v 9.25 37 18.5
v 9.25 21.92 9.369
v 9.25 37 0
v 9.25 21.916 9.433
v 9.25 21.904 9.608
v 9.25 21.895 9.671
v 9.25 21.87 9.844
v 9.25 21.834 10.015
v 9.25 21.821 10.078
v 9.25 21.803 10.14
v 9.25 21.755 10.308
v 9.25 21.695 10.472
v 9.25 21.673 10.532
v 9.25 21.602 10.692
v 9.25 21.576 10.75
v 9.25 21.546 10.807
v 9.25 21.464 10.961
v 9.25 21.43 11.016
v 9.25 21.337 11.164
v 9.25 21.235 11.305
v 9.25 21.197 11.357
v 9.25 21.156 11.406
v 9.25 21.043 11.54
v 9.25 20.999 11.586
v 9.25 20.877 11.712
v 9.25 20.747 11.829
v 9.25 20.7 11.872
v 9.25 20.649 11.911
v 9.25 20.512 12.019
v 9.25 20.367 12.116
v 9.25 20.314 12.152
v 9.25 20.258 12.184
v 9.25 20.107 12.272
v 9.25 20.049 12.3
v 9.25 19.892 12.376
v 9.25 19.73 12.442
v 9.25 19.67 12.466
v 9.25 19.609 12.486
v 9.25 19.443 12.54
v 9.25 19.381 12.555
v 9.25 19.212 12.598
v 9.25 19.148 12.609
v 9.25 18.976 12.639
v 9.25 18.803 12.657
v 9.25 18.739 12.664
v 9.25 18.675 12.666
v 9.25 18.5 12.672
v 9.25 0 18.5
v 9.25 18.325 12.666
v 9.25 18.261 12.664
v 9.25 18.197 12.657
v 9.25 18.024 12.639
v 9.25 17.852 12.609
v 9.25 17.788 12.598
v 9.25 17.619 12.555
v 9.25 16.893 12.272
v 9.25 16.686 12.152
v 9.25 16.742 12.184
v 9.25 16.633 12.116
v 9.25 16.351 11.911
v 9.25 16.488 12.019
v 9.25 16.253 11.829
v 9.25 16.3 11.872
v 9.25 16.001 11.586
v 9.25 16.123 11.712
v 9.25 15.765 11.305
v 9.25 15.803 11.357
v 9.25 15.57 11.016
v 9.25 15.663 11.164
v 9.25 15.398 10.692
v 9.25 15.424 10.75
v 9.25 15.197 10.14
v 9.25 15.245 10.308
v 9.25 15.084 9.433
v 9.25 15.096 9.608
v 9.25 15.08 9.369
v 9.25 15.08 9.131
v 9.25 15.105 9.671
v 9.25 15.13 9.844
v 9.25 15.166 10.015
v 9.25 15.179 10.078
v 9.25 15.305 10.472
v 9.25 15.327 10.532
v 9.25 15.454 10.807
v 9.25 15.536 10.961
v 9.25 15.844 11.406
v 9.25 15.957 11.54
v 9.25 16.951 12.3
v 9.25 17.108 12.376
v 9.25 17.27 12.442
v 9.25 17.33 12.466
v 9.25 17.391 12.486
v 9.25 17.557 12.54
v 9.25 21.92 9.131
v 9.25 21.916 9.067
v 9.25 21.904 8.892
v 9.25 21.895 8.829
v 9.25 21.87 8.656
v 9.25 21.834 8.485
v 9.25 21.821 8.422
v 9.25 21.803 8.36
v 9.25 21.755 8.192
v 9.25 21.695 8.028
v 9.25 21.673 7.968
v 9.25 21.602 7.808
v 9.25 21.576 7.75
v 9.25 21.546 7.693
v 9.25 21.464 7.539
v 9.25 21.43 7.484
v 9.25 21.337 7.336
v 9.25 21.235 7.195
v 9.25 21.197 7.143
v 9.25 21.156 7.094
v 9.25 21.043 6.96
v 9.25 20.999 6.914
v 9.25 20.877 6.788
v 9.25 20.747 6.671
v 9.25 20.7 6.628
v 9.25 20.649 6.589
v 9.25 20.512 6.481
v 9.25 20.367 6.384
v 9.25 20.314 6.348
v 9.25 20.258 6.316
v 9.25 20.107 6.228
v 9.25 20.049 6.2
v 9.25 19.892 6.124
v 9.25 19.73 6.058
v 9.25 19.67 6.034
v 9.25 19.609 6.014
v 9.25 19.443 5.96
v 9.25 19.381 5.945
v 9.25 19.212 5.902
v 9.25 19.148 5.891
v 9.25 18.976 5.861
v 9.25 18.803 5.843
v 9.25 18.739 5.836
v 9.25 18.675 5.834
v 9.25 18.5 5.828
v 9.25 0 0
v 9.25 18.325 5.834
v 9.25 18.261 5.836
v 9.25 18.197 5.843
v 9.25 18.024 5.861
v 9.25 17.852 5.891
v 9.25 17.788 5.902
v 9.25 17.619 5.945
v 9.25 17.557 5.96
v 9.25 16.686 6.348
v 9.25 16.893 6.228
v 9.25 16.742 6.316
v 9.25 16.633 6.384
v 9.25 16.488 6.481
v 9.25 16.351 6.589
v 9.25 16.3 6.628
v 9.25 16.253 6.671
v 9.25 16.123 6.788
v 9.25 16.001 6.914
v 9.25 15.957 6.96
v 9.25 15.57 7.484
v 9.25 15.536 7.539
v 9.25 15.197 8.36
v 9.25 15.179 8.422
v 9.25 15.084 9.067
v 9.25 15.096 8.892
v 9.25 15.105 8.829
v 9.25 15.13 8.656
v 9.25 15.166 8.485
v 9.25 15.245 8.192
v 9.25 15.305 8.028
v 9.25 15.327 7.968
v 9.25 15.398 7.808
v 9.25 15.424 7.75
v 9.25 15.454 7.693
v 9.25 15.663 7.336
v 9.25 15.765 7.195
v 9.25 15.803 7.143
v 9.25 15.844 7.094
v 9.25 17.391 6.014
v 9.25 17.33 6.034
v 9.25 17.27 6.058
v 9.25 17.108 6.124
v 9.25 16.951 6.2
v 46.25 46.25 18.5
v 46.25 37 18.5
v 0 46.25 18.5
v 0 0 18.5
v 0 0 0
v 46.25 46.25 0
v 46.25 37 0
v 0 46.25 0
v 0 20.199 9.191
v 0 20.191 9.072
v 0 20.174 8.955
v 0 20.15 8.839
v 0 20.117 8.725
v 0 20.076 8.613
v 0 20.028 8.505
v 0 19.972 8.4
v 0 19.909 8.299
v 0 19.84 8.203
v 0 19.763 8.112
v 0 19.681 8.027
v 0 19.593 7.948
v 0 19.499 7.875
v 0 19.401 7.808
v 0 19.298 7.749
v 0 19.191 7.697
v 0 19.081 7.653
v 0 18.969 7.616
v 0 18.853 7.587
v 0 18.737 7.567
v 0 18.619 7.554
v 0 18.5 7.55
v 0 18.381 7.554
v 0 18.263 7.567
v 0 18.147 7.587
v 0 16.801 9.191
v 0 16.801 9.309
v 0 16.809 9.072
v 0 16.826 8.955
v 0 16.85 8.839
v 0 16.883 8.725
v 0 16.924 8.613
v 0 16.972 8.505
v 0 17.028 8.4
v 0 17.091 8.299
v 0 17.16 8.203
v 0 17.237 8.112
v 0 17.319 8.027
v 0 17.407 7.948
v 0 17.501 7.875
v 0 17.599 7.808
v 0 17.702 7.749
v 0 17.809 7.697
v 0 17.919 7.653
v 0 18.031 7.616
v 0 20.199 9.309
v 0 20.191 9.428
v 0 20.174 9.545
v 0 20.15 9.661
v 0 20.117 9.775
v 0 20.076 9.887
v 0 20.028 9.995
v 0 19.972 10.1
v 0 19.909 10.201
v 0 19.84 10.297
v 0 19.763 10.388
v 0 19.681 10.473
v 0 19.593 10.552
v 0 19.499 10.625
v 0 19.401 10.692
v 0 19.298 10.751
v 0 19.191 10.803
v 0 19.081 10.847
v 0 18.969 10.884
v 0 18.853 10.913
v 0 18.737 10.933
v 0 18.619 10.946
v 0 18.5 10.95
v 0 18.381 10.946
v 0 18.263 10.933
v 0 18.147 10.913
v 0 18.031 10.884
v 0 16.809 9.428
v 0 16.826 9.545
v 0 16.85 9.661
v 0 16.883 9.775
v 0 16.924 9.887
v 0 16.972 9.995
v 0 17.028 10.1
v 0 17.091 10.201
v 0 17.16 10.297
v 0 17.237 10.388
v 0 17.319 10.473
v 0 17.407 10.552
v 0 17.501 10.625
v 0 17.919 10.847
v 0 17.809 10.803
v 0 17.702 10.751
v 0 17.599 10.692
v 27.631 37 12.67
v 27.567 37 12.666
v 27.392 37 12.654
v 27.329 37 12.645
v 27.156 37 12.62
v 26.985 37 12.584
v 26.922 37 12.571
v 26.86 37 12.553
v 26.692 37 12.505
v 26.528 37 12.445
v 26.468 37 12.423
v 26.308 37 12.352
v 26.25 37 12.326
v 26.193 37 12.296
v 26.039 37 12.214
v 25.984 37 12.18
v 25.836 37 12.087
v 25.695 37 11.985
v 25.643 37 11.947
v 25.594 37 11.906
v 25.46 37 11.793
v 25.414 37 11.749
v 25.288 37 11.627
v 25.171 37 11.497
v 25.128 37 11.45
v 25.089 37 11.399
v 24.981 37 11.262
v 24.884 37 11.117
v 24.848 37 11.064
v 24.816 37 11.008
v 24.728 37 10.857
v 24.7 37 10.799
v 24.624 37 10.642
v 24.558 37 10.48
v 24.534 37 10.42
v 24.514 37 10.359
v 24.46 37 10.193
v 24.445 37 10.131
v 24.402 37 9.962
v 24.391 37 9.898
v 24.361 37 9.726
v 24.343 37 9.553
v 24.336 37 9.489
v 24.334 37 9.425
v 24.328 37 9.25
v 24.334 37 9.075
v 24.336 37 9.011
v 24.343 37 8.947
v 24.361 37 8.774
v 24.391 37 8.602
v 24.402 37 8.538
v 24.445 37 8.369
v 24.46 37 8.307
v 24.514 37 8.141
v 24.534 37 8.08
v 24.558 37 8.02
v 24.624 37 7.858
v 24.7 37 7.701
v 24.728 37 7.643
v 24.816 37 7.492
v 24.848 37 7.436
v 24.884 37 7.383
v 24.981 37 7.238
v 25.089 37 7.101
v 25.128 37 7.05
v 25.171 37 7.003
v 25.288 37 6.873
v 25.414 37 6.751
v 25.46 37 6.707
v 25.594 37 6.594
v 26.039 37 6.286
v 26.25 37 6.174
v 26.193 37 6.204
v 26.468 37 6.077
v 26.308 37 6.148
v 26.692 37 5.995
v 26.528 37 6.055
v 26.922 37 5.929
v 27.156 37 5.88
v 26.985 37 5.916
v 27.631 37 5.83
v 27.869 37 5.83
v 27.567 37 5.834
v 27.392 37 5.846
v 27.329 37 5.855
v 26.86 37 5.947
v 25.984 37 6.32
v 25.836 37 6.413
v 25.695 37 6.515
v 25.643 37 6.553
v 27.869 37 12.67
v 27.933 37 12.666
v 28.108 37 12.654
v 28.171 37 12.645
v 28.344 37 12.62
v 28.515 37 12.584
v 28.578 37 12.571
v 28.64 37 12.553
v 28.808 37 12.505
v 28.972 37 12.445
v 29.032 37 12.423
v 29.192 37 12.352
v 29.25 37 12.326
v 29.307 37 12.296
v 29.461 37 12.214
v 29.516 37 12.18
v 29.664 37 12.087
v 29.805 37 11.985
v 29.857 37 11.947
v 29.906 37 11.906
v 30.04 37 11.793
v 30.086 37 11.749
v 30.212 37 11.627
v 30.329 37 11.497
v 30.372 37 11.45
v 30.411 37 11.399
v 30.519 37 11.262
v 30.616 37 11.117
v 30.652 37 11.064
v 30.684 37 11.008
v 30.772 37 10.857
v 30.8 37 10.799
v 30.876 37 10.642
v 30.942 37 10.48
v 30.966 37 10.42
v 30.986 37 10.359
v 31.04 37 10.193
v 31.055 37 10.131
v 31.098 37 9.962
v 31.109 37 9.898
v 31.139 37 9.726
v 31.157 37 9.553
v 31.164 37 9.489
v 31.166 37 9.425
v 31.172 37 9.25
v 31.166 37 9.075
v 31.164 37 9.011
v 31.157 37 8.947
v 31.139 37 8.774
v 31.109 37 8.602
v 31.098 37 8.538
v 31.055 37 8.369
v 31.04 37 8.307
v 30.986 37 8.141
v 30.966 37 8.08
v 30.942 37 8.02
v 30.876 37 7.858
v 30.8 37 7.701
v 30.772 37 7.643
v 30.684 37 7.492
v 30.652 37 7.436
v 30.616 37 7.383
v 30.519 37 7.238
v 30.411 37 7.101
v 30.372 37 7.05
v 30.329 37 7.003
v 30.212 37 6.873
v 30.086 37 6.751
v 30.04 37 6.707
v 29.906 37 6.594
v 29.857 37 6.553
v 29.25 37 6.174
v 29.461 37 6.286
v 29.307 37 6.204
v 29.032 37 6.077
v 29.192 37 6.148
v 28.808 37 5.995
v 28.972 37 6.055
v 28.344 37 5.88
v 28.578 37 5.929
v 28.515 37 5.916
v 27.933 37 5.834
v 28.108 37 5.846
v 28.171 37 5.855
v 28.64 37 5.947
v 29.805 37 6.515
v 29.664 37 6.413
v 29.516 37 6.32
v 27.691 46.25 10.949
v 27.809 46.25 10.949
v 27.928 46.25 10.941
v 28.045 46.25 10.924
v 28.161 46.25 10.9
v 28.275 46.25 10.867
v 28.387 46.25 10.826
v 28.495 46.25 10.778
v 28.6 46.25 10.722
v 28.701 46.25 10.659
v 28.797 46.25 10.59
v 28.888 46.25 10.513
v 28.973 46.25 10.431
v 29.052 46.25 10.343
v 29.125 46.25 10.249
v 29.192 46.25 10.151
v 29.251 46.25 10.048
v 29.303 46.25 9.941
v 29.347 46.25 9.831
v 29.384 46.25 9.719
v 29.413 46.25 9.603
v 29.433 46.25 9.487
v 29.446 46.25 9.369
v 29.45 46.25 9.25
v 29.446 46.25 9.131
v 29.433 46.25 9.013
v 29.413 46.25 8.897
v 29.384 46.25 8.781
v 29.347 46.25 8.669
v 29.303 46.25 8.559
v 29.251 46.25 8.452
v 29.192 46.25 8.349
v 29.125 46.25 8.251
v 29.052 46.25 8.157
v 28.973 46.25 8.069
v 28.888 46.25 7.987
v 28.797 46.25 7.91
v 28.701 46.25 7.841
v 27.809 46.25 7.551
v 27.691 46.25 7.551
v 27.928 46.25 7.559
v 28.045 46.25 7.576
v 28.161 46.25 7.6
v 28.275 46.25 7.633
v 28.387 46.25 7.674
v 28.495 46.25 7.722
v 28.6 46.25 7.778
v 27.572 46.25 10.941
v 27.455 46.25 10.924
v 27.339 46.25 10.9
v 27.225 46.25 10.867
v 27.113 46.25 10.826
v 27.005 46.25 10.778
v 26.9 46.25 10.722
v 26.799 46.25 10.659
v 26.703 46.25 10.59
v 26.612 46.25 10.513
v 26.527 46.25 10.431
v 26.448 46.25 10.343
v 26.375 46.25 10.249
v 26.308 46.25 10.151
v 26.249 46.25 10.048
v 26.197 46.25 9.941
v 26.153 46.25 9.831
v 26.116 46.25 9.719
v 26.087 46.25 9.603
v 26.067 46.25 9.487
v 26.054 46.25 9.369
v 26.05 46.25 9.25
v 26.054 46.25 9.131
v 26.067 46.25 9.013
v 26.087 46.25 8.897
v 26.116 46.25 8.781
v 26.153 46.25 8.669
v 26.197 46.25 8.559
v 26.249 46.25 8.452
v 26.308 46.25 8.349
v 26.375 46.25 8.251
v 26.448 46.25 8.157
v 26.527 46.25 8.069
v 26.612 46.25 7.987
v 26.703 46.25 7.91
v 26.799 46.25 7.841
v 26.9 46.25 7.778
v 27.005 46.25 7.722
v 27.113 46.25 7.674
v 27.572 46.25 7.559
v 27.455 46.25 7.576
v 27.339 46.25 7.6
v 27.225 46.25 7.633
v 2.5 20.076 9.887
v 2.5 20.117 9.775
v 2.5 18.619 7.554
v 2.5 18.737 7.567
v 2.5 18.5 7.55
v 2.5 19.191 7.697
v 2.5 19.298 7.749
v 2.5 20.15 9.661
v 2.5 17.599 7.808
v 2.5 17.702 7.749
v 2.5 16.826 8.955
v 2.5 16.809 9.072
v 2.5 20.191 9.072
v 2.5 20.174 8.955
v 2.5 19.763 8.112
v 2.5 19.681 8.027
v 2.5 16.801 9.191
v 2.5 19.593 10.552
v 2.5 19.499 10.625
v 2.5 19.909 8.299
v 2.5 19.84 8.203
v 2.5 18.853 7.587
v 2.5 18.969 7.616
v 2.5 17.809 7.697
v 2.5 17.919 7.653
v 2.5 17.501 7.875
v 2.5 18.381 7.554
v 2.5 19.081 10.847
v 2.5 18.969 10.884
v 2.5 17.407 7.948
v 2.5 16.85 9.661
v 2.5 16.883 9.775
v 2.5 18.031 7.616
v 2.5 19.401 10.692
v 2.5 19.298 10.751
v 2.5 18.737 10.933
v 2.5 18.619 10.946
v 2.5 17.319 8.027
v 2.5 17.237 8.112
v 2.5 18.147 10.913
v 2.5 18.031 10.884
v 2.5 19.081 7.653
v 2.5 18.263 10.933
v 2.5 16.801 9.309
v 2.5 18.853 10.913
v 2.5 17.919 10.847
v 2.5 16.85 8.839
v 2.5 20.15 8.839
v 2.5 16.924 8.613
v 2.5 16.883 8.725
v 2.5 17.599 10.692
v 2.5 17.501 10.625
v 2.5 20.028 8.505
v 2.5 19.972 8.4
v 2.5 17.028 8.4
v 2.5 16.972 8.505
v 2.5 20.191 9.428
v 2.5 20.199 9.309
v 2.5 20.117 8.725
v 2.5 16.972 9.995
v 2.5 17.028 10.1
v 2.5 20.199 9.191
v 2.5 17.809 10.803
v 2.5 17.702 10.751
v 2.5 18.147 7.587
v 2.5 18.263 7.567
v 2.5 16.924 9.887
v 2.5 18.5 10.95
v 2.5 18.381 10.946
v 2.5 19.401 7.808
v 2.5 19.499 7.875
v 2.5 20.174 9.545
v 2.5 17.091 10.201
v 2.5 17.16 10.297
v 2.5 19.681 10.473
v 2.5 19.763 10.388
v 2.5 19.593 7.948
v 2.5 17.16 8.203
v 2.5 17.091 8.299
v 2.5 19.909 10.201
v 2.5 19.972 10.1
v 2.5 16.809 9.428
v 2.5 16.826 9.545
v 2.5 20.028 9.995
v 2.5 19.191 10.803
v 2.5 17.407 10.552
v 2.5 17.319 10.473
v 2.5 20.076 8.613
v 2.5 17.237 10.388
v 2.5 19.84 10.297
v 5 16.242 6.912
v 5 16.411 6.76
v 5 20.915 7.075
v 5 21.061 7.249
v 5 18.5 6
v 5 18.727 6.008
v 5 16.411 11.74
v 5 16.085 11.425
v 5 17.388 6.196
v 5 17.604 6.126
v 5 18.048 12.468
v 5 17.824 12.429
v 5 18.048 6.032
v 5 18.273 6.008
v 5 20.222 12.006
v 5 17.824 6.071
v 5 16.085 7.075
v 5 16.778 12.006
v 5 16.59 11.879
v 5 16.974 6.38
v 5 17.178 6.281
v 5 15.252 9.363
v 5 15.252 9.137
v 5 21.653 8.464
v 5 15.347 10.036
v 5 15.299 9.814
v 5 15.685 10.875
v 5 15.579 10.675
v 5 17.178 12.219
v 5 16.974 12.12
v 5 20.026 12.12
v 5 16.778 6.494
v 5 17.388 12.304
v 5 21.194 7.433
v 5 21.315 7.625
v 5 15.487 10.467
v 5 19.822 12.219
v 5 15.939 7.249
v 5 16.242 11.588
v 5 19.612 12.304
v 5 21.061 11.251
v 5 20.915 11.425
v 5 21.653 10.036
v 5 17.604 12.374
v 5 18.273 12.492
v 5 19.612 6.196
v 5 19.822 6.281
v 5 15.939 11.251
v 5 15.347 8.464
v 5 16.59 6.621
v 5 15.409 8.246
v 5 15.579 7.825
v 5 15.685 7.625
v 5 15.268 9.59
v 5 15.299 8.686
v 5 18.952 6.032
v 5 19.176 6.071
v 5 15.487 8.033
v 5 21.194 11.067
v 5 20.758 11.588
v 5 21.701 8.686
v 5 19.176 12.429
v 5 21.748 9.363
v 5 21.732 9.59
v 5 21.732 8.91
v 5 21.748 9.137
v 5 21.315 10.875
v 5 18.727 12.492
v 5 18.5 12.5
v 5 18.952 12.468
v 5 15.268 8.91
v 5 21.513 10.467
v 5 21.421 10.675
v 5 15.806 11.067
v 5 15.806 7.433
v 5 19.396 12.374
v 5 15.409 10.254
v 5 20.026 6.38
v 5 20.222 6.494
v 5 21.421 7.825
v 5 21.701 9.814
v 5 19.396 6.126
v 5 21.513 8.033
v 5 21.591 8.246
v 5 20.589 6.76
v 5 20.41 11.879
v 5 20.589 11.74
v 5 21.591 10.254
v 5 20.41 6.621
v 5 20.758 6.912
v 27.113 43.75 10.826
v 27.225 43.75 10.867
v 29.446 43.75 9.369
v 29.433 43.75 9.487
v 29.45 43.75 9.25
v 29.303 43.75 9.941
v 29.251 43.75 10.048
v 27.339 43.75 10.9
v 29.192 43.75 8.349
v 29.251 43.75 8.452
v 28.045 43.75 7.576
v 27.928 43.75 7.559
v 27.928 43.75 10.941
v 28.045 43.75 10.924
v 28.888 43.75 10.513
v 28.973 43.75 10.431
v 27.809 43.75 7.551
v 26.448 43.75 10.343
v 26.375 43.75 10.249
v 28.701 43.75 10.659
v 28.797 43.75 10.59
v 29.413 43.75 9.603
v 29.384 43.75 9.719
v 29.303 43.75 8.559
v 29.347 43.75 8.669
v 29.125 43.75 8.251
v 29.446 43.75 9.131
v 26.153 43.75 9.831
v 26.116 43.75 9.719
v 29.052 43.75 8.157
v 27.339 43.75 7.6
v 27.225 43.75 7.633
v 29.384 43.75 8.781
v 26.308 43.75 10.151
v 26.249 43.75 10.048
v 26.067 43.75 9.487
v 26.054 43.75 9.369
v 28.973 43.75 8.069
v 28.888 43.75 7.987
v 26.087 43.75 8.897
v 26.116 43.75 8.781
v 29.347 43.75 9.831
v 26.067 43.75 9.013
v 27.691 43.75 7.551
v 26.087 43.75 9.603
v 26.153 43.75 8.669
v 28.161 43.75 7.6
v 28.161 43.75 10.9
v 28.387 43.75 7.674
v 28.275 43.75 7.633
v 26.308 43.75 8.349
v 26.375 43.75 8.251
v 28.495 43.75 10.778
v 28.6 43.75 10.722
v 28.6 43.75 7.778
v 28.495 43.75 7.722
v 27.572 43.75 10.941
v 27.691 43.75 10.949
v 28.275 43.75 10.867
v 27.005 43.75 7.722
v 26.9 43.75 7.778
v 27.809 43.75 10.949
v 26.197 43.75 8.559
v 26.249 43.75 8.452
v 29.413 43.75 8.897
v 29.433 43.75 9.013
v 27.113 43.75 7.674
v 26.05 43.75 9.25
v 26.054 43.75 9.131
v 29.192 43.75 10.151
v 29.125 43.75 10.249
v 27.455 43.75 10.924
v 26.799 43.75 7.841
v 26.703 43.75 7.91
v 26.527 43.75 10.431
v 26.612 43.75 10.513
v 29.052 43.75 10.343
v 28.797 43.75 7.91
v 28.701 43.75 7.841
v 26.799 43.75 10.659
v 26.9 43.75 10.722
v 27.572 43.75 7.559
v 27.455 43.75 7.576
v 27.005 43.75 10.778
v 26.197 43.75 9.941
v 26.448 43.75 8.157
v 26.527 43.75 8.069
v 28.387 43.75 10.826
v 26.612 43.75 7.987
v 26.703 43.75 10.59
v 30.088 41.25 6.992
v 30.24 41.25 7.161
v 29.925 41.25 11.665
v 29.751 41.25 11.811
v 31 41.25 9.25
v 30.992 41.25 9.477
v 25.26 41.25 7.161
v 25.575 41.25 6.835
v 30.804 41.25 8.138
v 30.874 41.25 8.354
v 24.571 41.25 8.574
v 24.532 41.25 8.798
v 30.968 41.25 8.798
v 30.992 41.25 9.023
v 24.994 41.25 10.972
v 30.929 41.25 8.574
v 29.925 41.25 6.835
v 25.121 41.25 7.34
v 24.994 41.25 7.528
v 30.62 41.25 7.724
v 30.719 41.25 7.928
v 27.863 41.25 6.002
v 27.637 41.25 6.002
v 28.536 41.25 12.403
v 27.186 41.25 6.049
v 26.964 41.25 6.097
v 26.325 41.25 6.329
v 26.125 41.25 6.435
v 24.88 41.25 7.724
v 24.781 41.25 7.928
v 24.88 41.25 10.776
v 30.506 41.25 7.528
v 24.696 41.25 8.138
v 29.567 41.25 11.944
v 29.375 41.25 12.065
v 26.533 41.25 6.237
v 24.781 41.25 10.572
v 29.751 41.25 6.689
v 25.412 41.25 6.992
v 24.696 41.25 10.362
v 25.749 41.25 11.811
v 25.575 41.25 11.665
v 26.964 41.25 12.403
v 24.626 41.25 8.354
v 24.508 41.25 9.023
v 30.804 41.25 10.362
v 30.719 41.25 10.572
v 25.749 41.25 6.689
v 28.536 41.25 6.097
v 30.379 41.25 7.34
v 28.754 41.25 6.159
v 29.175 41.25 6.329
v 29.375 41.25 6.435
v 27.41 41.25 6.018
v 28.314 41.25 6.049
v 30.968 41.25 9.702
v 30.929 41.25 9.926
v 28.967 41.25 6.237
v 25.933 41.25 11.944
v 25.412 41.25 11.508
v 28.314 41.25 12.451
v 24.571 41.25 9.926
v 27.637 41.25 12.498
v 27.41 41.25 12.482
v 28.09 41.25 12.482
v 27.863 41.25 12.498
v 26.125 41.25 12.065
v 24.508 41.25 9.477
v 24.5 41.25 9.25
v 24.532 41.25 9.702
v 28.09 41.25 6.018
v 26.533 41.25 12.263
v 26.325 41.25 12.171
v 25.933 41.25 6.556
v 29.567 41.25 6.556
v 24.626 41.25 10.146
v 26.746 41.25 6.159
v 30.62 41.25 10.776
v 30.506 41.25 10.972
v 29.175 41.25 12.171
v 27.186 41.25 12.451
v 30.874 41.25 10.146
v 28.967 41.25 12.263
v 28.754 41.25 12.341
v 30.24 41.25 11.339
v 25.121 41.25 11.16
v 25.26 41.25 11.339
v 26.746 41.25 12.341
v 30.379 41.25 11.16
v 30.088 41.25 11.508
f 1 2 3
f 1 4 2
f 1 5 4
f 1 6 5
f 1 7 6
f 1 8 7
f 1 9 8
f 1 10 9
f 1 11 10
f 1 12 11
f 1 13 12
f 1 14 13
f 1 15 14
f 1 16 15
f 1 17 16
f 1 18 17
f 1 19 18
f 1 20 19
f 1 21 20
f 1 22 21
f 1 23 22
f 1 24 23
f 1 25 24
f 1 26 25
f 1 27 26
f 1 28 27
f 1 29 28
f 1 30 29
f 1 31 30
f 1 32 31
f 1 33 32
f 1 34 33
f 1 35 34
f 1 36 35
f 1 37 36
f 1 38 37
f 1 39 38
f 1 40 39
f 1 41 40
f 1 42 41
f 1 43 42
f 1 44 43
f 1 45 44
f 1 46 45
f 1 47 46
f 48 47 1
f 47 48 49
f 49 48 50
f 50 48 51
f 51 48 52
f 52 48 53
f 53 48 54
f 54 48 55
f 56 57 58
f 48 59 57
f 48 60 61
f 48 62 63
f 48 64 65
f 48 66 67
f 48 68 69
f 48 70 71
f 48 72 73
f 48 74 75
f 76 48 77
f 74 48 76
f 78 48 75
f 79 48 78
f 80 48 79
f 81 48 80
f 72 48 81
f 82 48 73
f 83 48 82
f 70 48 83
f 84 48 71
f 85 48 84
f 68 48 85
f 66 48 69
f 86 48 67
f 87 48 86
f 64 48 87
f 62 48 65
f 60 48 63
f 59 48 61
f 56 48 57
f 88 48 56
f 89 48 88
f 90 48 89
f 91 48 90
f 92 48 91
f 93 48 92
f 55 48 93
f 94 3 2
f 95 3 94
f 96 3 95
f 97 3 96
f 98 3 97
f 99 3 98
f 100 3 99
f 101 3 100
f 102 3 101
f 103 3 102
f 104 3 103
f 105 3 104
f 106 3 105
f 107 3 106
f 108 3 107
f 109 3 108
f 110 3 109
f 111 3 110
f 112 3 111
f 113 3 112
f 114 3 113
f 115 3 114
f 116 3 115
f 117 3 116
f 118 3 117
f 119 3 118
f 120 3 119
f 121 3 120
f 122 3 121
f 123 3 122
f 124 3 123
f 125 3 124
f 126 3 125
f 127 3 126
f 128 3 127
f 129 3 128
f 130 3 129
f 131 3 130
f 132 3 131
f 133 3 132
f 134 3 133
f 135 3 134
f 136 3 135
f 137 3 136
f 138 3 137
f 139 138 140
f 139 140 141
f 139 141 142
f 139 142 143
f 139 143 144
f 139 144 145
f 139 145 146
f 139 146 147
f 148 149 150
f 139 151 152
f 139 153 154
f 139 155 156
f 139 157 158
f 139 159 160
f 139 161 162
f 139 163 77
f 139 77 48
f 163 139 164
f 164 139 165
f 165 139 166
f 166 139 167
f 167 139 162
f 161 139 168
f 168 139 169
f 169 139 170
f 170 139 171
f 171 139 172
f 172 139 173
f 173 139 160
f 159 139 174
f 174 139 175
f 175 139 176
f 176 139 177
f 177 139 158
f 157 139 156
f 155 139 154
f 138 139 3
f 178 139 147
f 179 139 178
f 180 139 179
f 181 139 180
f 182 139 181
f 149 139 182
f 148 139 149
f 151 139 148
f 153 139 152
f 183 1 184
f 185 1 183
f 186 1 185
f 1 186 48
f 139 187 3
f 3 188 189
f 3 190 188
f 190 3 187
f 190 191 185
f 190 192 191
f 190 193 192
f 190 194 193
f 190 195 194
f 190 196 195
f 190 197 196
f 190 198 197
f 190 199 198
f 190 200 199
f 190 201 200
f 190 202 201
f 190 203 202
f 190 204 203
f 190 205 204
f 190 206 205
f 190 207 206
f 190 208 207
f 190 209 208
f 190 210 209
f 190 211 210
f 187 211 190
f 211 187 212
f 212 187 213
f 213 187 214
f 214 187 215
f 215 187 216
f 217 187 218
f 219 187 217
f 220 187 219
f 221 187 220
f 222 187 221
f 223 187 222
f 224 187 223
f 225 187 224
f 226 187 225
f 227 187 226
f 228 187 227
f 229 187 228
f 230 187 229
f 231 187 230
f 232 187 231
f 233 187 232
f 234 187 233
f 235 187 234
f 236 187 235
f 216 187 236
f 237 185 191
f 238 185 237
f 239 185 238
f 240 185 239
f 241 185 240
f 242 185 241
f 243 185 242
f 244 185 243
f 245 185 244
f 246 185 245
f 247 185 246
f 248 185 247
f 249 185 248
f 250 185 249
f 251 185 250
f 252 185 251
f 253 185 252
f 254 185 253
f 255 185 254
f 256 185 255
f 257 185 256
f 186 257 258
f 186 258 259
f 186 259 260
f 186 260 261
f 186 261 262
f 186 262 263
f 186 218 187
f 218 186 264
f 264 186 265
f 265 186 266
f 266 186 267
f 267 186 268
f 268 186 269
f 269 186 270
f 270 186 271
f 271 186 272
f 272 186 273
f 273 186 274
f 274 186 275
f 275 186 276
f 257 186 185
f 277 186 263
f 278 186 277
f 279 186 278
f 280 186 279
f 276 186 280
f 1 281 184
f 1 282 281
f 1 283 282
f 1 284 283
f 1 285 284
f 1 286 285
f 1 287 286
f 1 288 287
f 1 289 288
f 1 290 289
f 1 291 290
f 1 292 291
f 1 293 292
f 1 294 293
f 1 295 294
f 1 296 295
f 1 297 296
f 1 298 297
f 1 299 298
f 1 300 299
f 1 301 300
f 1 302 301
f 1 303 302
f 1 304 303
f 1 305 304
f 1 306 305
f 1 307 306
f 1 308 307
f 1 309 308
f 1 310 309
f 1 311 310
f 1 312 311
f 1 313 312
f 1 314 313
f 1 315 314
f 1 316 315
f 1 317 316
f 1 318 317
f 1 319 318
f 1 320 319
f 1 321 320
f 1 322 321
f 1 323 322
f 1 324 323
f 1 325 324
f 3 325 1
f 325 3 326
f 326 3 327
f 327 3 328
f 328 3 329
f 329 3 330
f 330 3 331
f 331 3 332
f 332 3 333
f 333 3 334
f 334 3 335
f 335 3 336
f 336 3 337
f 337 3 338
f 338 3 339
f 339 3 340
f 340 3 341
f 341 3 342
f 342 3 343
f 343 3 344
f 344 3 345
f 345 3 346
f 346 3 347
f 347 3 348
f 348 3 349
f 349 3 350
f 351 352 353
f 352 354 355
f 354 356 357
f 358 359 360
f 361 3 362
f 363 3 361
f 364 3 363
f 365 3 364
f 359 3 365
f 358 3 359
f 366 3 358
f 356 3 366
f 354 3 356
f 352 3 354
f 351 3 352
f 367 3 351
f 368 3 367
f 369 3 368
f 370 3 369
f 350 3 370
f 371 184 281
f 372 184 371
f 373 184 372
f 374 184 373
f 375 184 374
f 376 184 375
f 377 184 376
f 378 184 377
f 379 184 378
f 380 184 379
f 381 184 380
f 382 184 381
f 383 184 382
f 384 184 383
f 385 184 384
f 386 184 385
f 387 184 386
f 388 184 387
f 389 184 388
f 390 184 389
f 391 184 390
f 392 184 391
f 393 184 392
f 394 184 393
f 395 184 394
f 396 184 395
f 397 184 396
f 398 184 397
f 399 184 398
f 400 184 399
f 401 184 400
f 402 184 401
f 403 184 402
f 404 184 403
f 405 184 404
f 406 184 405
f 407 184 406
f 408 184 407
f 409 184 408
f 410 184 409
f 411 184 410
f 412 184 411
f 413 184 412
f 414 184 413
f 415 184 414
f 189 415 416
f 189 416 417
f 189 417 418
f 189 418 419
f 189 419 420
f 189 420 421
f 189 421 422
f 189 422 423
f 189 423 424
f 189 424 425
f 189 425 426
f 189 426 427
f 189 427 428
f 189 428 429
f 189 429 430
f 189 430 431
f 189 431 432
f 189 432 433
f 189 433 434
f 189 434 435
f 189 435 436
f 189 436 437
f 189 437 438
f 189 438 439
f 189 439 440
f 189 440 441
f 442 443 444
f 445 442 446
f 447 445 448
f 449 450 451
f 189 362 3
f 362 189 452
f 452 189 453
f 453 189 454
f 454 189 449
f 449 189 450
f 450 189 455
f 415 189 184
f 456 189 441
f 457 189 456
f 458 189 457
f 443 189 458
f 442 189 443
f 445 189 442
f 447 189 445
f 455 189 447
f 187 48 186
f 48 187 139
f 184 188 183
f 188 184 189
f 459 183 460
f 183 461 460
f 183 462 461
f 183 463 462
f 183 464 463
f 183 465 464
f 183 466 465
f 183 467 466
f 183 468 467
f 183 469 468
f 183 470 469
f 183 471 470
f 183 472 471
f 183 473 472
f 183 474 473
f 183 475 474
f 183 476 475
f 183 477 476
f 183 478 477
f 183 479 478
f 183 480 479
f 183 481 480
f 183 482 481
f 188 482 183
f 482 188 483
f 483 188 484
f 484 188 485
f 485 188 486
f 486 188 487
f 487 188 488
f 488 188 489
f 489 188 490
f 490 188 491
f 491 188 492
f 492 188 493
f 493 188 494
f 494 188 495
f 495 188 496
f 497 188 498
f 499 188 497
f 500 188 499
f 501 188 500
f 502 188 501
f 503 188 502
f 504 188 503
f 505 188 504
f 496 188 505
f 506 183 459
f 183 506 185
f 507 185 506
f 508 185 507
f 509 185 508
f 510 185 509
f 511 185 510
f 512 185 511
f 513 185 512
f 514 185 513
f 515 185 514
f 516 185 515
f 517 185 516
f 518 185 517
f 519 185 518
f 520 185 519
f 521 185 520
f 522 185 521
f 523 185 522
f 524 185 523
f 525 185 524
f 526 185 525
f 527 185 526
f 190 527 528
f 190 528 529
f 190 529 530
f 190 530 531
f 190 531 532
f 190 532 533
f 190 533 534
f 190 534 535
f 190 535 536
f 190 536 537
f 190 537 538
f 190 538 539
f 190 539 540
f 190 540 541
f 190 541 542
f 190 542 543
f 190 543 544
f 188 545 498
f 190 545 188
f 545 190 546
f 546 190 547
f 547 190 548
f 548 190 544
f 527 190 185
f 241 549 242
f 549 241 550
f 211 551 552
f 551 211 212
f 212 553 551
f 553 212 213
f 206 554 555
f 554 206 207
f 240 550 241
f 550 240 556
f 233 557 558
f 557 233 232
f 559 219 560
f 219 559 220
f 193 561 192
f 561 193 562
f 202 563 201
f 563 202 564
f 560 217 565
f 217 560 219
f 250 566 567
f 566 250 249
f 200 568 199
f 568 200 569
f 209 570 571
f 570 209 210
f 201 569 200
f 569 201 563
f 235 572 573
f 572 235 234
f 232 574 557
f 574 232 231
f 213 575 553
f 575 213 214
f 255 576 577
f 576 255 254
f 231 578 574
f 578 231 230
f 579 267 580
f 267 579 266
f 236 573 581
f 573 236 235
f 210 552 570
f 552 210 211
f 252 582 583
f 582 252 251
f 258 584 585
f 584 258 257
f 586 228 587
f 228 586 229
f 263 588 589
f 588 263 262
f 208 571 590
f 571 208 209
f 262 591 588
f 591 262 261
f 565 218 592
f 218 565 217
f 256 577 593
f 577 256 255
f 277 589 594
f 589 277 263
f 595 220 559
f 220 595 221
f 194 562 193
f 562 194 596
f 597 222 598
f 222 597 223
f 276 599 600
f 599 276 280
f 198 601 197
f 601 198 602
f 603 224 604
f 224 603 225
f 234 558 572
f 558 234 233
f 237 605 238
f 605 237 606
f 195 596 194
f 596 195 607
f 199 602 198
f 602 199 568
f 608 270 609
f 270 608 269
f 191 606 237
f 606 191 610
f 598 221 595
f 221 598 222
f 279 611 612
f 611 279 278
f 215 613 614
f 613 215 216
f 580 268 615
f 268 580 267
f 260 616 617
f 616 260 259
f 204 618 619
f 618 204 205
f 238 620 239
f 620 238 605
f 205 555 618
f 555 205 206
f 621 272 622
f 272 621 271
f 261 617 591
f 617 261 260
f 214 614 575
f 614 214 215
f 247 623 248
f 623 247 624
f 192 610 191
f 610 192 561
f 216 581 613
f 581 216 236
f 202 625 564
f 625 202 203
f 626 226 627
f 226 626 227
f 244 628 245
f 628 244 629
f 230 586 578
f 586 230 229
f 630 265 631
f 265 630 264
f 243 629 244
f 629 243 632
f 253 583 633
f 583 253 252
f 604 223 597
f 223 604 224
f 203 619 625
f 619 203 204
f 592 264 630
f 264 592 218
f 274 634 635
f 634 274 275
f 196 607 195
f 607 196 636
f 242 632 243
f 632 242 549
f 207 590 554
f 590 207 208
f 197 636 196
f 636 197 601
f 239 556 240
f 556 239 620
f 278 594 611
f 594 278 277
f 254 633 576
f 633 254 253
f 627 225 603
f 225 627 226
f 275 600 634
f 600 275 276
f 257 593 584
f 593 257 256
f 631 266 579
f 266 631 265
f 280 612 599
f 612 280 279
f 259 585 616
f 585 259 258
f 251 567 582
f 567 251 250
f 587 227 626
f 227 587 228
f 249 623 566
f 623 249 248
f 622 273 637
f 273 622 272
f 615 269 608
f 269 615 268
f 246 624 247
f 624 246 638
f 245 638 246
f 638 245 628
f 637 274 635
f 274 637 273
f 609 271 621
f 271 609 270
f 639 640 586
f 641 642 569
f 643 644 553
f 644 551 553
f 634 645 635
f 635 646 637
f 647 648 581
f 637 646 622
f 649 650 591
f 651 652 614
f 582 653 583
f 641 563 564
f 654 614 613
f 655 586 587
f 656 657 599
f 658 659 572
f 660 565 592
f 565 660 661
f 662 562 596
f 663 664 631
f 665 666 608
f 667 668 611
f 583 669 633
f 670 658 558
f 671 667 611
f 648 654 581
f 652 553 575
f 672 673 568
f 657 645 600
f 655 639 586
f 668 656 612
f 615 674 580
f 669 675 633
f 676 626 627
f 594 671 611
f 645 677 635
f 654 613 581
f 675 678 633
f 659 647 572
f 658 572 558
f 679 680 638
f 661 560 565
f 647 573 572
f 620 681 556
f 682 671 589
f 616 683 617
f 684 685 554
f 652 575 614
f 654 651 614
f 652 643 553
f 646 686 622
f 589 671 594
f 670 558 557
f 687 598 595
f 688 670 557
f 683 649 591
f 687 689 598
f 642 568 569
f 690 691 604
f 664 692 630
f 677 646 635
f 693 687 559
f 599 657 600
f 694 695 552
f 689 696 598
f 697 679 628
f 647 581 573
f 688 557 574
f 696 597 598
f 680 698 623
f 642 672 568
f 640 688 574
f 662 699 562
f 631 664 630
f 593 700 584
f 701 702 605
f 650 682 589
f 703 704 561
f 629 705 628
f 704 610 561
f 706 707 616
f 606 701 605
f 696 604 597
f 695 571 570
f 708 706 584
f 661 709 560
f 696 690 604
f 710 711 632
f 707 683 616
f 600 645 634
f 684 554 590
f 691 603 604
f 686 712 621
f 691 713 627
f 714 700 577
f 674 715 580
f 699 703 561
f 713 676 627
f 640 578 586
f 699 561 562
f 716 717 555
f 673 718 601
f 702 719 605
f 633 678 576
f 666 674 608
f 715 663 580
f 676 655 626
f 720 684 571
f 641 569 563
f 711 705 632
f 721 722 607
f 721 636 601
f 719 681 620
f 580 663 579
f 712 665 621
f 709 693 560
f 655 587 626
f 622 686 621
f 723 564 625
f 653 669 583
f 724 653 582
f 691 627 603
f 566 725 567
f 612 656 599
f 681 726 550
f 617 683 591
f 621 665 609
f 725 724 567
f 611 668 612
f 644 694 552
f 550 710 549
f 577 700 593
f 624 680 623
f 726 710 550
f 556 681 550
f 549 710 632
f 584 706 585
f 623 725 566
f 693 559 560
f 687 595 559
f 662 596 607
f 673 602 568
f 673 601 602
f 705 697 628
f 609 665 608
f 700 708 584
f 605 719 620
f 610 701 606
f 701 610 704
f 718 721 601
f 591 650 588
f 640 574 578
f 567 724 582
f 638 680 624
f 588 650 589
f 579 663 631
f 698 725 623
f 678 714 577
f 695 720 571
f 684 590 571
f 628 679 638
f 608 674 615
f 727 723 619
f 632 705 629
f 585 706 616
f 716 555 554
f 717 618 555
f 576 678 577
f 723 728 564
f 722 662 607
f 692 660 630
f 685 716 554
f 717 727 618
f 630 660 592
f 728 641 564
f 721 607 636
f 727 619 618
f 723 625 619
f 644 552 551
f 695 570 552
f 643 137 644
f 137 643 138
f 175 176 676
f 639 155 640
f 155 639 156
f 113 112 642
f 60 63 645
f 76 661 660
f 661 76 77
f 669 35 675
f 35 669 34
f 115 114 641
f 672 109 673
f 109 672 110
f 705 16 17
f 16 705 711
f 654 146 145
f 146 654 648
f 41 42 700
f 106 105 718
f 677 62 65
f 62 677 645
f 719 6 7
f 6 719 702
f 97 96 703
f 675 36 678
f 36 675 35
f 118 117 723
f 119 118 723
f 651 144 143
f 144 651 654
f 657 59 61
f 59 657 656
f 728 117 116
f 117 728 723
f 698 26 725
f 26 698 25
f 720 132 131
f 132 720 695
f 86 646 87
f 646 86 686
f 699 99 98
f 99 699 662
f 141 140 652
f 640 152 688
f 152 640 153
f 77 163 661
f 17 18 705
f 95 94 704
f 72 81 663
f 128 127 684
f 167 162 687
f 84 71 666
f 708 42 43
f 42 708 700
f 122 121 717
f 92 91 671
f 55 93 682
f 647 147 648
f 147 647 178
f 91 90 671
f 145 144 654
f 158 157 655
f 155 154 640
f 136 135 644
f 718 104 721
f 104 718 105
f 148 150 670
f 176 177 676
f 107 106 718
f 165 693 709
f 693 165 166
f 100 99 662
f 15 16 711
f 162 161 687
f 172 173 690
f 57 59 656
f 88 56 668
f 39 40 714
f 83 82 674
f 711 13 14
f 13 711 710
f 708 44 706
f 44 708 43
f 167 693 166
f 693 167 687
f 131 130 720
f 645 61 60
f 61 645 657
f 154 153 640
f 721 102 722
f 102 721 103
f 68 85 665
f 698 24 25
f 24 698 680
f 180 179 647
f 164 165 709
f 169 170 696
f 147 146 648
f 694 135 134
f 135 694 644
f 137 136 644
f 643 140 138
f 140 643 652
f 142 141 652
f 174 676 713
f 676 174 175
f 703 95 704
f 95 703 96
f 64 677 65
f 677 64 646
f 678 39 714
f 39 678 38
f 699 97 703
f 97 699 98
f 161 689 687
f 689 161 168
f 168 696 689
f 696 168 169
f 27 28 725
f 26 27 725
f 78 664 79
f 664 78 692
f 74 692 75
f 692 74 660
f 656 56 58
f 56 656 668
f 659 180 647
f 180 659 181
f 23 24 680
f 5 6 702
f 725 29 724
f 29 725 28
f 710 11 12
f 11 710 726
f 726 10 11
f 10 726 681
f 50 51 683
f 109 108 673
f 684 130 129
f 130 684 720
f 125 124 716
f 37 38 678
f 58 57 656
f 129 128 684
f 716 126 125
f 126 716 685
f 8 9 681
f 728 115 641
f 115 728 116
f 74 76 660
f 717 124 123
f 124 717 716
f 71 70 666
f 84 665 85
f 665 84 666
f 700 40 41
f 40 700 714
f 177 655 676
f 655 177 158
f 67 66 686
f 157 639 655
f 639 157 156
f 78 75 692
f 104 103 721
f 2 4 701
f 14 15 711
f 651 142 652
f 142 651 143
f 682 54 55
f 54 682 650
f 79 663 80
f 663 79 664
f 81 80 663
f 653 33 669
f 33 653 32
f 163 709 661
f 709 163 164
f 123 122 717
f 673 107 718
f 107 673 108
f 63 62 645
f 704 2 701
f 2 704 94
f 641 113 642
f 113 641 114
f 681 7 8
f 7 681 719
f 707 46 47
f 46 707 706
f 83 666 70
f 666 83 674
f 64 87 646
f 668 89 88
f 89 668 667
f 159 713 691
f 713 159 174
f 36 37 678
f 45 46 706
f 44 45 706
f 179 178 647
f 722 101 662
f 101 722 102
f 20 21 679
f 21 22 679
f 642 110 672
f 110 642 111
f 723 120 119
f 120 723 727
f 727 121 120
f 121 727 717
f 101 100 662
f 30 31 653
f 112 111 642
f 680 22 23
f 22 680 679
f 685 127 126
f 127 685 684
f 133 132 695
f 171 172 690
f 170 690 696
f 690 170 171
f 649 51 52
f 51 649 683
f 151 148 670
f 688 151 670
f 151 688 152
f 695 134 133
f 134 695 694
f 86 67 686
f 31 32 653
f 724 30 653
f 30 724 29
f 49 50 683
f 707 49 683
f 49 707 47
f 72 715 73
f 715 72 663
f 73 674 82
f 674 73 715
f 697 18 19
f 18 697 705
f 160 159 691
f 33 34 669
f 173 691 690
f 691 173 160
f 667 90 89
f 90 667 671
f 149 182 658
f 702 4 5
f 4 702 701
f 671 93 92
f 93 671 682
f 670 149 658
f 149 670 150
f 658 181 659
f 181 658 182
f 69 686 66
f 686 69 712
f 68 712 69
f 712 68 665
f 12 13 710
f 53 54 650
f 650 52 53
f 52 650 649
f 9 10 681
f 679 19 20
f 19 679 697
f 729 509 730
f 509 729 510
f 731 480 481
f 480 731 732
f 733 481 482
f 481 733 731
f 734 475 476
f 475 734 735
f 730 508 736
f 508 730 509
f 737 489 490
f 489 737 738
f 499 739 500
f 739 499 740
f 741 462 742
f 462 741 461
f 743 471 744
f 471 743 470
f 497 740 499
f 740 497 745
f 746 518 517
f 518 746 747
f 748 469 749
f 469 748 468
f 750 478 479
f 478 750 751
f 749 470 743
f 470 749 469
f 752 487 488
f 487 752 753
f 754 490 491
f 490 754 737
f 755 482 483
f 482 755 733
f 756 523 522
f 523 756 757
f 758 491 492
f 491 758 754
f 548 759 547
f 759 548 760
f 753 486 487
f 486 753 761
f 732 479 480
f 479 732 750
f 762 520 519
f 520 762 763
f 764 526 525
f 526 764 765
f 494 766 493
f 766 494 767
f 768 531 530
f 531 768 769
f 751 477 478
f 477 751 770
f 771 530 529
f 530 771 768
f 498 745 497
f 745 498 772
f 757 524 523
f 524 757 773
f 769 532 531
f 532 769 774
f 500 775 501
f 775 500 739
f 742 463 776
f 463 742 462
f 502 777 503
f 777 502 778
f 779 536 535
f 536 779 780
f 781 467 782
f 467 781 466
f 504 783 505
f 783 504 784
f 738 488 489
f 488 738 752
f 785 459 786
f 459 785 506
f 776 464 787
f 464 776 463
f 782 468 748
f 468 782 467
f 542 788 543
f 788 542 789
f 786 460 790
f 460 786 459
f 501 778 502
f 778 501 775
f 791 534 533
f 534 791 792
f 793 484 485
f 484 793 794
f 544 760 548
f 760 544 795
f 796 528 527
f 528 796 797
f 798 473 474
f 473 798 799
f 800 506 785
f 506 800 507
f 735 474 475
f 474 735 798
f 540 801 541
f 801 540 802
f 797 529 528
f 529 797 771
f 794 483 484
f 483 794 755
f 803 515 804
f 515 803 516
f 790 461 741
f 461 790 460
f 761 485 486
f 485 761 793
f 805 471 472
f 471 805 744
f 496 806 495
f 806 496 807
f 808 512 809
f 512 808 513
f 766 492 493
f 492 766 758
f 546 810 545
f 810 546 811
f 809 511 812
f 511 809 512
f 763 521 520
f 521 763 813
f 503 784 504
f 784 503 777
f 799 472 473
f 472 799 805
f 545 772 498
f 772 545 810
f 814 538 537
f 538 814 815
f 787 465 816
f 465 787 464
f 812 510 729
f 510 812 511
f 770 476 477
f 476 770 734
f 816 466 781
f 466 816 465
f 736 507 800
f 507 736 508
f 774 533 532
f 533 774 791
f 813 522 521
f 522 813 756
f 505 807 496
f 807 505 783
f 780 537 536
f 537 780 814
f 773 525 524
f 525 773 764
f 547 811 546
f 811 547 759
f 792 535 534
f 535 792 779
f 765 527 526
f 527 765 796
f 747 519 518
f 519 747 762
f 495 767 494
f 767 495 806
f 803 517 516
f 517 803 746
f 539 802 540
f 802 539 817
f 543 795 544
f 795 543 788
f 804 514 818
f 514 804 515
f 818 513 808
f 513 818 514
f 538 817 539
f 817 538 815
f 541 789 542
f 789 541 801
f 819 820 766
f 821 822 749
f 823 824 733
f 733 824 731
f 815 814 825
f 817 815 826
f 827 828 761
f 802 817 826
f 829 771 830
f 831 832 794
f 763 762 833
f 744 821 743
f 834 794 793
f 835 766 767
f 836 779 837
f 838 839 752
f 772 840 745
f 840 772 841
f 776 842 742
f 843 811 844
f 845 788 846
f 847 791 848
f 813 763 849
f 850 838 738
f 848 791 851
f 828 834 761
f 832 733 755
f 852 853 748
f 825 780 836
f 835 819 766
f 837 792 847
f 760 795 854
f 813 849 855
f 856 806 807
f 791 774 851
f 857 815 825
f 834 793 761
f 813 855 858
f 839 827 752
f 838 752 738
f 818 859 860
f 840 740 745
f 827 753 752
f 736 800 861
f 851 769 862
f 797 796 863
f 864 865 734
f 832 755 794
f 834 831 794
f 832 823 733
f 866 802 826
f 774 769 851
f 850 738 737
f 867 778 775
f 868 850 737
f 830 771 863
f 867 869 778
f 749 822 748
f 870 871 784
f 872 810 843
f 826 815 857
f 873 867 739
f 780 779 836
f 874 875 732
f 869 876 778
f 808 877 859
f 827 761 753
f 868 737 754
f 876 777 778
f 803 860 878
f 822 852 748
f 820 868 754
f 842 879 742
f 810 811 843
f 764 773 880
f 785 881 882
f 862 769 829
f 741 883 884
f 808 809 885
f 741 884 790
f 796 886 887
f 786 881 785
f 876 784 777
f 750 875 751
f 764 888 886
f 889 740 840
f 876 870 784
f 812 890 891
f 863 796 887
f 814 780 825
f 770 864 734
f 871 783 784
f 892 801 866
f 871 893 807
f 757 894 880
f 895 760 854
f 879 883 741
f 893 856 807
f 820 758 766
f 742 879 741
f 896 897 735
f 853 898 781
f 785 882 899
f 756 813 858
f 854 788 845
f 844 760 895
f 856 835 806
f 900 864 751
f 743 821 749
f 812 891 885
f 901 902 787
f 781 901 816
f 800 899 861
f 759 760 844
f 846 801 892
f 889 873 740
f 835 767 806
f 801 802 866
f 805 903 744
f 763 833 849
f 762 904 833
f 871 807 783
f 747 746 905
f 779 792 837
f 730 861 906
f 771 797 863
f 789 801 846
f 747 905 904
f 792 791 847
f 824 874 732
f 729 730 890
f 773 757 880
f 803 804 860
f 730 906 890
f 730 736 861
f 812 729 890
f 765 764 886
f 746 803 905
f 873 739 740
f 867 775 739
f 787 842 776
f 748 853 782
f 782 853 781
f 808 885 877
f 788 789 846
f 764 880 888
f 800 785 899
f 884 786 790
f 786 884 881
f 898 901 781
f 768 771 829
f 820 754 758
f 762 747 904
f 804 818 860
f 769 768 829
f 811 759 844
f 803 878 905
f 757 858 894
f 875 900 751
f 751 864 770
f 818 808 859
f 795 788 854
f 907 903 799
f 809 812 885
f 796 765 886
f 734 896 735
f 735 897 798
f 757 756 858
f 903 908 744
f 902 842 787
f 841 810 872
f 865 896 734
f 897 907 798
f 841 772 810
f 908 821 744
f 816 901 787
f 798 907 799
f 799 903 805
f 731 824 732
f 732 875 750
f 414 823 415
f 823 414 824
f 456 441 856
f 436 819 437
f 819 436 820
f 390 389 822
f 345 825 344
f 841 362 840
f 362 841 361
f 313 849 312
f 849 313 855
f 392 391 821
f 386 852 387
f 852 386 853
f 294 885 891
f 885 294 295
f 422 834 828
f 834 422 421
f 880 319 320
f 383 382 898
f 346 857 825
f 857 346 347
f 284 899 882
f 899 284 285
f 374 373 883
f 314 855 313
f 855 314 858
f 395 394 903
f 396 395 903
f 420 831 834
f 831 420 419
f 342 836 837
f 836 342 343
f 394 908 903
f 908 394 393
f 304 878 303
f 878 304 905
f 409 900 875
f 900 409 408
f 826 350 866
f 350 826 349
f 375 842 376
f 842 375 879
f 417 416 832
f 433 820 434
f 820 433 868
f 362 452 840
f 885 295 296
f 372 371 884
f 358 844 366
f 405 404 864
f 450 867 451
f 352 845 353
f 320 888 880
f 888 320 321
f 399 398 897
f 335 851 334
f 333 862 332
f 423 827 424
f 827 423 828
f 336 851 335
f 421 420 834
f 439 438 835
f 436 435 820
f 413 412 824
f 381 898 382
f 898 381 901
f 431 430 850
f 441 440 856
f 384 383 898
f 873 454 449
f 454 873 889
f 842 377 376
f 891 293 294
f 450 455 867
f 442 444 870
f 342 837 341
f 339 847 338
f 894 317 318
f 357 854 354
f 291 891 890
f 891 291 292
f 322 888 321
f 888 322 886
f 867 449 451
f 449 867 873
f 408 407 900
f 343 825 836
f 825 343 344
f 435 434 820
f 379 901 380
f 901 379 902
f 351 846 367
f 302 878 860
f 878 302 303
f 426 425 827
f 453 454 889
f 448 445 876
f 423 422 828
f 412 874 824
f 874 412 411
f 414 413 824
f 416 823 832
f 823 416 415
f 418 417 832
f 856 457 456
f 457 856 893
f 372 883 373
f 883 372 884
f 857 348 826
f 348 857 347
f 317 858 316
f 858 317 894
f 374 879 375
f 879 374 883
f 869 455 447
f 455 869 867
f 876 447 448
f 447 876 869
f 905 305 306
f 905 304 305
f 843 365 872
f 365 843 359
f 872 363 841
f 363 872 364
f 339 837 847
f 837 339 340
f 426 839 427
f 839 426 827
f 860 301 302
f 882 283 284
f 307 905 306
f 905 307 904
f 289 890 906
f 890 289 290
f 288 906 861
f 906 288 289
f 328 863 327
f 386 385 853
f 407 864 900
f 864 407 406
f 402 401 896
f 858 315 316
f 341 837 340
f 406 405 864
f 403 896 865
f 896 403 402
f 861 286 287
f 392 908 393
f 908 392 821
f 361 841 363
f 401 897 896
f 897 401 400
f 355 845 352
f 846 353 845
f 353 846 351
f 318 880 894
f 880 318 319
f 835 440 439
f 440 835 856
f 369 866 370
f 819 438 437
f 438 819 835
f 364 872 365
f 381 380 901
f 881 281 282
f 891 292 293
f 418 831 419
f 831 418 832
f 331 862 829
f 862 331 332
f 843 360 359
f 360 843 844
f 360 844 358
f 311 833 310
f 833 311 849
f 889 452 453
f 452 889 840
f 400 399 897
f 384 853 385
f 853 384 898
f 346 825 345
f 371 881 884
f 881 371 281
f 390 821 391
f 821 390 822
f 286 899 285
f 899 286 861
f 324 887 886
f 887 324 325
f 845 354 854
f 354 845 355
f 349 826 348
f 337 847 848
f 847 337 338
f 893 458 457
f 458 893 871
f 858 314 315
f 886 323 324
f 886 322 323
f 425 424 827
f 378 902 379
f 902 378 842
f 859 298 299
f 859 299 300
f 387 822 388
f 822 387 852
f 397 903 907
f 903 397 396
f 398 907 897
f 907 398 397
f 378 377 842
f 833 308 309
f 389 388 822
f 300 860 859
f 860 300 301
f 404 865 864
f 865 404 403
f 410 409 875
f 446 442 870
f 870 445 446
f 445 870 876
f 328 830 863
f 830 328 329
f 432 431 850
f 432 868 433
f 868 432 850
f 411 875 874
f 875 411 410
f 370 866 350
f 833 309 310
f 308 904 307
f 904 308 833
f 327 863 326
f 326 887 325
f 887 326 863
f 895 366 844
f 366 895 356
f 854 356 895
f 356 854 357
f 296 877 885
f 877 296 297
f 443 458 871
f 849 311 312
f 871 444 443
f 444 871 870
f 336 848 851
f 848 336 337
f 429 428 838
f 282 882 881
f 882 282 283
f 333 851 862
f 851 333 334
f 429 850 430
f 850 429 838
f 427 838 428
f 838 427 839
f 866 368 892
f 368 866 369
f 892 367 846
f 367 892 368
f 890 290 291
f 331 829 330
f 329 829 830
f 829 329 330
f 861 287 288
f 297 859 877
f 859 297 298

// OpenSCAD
//Schreibtischeckhalter2
$fn=90;
//Dicke Schreibtischplatte
d1=37;
//Dicke Brett
d2=18.5;
//Dicke Schreibtischplatte hinten ab Blech noch
d3=15;
//Dicke Blech
db=2.3;
//Durchmesser Schraube
ds=3.4;
//Kopfhöhe Schraube
khs=2.5;
//Durchmesser Schraubenkopf
dsk=6.5;
//Durchmesser Bit
dbit=8;


//Höhe Eckhalter
he=d1-d2;
//Breite Eckhalter
be=he; //wir nehmen mal die Höhe als Breite auch
te=he; //hier genauso

module schraube()
{
    
    {
    cylinder(h=he, d=ds);
    translate([0,0,he])
    cylinder(h=khs, d1=ds, d2=dsk);
    
    translate([0,0,he+khs])
    cylinder(h=he, d1=dsk, d2=dbit);
    }
}

module ecke()
{
cube([d2/2,d2*2,d2]);
translate([0,d2*2,0])
cube([d2*2+d2/2,d2/2,d2]);
}

module schrauben()
{
translate([-he+khs,d2,d2/2])
rotate([0,90,0])
schraube();

translate([d2/2+d2,d2*2+d2/2+he-khs,d2/2])
rotate([90,0,0])
schraube();
}

difference()
{
    ecke();
    schrauben();
}
